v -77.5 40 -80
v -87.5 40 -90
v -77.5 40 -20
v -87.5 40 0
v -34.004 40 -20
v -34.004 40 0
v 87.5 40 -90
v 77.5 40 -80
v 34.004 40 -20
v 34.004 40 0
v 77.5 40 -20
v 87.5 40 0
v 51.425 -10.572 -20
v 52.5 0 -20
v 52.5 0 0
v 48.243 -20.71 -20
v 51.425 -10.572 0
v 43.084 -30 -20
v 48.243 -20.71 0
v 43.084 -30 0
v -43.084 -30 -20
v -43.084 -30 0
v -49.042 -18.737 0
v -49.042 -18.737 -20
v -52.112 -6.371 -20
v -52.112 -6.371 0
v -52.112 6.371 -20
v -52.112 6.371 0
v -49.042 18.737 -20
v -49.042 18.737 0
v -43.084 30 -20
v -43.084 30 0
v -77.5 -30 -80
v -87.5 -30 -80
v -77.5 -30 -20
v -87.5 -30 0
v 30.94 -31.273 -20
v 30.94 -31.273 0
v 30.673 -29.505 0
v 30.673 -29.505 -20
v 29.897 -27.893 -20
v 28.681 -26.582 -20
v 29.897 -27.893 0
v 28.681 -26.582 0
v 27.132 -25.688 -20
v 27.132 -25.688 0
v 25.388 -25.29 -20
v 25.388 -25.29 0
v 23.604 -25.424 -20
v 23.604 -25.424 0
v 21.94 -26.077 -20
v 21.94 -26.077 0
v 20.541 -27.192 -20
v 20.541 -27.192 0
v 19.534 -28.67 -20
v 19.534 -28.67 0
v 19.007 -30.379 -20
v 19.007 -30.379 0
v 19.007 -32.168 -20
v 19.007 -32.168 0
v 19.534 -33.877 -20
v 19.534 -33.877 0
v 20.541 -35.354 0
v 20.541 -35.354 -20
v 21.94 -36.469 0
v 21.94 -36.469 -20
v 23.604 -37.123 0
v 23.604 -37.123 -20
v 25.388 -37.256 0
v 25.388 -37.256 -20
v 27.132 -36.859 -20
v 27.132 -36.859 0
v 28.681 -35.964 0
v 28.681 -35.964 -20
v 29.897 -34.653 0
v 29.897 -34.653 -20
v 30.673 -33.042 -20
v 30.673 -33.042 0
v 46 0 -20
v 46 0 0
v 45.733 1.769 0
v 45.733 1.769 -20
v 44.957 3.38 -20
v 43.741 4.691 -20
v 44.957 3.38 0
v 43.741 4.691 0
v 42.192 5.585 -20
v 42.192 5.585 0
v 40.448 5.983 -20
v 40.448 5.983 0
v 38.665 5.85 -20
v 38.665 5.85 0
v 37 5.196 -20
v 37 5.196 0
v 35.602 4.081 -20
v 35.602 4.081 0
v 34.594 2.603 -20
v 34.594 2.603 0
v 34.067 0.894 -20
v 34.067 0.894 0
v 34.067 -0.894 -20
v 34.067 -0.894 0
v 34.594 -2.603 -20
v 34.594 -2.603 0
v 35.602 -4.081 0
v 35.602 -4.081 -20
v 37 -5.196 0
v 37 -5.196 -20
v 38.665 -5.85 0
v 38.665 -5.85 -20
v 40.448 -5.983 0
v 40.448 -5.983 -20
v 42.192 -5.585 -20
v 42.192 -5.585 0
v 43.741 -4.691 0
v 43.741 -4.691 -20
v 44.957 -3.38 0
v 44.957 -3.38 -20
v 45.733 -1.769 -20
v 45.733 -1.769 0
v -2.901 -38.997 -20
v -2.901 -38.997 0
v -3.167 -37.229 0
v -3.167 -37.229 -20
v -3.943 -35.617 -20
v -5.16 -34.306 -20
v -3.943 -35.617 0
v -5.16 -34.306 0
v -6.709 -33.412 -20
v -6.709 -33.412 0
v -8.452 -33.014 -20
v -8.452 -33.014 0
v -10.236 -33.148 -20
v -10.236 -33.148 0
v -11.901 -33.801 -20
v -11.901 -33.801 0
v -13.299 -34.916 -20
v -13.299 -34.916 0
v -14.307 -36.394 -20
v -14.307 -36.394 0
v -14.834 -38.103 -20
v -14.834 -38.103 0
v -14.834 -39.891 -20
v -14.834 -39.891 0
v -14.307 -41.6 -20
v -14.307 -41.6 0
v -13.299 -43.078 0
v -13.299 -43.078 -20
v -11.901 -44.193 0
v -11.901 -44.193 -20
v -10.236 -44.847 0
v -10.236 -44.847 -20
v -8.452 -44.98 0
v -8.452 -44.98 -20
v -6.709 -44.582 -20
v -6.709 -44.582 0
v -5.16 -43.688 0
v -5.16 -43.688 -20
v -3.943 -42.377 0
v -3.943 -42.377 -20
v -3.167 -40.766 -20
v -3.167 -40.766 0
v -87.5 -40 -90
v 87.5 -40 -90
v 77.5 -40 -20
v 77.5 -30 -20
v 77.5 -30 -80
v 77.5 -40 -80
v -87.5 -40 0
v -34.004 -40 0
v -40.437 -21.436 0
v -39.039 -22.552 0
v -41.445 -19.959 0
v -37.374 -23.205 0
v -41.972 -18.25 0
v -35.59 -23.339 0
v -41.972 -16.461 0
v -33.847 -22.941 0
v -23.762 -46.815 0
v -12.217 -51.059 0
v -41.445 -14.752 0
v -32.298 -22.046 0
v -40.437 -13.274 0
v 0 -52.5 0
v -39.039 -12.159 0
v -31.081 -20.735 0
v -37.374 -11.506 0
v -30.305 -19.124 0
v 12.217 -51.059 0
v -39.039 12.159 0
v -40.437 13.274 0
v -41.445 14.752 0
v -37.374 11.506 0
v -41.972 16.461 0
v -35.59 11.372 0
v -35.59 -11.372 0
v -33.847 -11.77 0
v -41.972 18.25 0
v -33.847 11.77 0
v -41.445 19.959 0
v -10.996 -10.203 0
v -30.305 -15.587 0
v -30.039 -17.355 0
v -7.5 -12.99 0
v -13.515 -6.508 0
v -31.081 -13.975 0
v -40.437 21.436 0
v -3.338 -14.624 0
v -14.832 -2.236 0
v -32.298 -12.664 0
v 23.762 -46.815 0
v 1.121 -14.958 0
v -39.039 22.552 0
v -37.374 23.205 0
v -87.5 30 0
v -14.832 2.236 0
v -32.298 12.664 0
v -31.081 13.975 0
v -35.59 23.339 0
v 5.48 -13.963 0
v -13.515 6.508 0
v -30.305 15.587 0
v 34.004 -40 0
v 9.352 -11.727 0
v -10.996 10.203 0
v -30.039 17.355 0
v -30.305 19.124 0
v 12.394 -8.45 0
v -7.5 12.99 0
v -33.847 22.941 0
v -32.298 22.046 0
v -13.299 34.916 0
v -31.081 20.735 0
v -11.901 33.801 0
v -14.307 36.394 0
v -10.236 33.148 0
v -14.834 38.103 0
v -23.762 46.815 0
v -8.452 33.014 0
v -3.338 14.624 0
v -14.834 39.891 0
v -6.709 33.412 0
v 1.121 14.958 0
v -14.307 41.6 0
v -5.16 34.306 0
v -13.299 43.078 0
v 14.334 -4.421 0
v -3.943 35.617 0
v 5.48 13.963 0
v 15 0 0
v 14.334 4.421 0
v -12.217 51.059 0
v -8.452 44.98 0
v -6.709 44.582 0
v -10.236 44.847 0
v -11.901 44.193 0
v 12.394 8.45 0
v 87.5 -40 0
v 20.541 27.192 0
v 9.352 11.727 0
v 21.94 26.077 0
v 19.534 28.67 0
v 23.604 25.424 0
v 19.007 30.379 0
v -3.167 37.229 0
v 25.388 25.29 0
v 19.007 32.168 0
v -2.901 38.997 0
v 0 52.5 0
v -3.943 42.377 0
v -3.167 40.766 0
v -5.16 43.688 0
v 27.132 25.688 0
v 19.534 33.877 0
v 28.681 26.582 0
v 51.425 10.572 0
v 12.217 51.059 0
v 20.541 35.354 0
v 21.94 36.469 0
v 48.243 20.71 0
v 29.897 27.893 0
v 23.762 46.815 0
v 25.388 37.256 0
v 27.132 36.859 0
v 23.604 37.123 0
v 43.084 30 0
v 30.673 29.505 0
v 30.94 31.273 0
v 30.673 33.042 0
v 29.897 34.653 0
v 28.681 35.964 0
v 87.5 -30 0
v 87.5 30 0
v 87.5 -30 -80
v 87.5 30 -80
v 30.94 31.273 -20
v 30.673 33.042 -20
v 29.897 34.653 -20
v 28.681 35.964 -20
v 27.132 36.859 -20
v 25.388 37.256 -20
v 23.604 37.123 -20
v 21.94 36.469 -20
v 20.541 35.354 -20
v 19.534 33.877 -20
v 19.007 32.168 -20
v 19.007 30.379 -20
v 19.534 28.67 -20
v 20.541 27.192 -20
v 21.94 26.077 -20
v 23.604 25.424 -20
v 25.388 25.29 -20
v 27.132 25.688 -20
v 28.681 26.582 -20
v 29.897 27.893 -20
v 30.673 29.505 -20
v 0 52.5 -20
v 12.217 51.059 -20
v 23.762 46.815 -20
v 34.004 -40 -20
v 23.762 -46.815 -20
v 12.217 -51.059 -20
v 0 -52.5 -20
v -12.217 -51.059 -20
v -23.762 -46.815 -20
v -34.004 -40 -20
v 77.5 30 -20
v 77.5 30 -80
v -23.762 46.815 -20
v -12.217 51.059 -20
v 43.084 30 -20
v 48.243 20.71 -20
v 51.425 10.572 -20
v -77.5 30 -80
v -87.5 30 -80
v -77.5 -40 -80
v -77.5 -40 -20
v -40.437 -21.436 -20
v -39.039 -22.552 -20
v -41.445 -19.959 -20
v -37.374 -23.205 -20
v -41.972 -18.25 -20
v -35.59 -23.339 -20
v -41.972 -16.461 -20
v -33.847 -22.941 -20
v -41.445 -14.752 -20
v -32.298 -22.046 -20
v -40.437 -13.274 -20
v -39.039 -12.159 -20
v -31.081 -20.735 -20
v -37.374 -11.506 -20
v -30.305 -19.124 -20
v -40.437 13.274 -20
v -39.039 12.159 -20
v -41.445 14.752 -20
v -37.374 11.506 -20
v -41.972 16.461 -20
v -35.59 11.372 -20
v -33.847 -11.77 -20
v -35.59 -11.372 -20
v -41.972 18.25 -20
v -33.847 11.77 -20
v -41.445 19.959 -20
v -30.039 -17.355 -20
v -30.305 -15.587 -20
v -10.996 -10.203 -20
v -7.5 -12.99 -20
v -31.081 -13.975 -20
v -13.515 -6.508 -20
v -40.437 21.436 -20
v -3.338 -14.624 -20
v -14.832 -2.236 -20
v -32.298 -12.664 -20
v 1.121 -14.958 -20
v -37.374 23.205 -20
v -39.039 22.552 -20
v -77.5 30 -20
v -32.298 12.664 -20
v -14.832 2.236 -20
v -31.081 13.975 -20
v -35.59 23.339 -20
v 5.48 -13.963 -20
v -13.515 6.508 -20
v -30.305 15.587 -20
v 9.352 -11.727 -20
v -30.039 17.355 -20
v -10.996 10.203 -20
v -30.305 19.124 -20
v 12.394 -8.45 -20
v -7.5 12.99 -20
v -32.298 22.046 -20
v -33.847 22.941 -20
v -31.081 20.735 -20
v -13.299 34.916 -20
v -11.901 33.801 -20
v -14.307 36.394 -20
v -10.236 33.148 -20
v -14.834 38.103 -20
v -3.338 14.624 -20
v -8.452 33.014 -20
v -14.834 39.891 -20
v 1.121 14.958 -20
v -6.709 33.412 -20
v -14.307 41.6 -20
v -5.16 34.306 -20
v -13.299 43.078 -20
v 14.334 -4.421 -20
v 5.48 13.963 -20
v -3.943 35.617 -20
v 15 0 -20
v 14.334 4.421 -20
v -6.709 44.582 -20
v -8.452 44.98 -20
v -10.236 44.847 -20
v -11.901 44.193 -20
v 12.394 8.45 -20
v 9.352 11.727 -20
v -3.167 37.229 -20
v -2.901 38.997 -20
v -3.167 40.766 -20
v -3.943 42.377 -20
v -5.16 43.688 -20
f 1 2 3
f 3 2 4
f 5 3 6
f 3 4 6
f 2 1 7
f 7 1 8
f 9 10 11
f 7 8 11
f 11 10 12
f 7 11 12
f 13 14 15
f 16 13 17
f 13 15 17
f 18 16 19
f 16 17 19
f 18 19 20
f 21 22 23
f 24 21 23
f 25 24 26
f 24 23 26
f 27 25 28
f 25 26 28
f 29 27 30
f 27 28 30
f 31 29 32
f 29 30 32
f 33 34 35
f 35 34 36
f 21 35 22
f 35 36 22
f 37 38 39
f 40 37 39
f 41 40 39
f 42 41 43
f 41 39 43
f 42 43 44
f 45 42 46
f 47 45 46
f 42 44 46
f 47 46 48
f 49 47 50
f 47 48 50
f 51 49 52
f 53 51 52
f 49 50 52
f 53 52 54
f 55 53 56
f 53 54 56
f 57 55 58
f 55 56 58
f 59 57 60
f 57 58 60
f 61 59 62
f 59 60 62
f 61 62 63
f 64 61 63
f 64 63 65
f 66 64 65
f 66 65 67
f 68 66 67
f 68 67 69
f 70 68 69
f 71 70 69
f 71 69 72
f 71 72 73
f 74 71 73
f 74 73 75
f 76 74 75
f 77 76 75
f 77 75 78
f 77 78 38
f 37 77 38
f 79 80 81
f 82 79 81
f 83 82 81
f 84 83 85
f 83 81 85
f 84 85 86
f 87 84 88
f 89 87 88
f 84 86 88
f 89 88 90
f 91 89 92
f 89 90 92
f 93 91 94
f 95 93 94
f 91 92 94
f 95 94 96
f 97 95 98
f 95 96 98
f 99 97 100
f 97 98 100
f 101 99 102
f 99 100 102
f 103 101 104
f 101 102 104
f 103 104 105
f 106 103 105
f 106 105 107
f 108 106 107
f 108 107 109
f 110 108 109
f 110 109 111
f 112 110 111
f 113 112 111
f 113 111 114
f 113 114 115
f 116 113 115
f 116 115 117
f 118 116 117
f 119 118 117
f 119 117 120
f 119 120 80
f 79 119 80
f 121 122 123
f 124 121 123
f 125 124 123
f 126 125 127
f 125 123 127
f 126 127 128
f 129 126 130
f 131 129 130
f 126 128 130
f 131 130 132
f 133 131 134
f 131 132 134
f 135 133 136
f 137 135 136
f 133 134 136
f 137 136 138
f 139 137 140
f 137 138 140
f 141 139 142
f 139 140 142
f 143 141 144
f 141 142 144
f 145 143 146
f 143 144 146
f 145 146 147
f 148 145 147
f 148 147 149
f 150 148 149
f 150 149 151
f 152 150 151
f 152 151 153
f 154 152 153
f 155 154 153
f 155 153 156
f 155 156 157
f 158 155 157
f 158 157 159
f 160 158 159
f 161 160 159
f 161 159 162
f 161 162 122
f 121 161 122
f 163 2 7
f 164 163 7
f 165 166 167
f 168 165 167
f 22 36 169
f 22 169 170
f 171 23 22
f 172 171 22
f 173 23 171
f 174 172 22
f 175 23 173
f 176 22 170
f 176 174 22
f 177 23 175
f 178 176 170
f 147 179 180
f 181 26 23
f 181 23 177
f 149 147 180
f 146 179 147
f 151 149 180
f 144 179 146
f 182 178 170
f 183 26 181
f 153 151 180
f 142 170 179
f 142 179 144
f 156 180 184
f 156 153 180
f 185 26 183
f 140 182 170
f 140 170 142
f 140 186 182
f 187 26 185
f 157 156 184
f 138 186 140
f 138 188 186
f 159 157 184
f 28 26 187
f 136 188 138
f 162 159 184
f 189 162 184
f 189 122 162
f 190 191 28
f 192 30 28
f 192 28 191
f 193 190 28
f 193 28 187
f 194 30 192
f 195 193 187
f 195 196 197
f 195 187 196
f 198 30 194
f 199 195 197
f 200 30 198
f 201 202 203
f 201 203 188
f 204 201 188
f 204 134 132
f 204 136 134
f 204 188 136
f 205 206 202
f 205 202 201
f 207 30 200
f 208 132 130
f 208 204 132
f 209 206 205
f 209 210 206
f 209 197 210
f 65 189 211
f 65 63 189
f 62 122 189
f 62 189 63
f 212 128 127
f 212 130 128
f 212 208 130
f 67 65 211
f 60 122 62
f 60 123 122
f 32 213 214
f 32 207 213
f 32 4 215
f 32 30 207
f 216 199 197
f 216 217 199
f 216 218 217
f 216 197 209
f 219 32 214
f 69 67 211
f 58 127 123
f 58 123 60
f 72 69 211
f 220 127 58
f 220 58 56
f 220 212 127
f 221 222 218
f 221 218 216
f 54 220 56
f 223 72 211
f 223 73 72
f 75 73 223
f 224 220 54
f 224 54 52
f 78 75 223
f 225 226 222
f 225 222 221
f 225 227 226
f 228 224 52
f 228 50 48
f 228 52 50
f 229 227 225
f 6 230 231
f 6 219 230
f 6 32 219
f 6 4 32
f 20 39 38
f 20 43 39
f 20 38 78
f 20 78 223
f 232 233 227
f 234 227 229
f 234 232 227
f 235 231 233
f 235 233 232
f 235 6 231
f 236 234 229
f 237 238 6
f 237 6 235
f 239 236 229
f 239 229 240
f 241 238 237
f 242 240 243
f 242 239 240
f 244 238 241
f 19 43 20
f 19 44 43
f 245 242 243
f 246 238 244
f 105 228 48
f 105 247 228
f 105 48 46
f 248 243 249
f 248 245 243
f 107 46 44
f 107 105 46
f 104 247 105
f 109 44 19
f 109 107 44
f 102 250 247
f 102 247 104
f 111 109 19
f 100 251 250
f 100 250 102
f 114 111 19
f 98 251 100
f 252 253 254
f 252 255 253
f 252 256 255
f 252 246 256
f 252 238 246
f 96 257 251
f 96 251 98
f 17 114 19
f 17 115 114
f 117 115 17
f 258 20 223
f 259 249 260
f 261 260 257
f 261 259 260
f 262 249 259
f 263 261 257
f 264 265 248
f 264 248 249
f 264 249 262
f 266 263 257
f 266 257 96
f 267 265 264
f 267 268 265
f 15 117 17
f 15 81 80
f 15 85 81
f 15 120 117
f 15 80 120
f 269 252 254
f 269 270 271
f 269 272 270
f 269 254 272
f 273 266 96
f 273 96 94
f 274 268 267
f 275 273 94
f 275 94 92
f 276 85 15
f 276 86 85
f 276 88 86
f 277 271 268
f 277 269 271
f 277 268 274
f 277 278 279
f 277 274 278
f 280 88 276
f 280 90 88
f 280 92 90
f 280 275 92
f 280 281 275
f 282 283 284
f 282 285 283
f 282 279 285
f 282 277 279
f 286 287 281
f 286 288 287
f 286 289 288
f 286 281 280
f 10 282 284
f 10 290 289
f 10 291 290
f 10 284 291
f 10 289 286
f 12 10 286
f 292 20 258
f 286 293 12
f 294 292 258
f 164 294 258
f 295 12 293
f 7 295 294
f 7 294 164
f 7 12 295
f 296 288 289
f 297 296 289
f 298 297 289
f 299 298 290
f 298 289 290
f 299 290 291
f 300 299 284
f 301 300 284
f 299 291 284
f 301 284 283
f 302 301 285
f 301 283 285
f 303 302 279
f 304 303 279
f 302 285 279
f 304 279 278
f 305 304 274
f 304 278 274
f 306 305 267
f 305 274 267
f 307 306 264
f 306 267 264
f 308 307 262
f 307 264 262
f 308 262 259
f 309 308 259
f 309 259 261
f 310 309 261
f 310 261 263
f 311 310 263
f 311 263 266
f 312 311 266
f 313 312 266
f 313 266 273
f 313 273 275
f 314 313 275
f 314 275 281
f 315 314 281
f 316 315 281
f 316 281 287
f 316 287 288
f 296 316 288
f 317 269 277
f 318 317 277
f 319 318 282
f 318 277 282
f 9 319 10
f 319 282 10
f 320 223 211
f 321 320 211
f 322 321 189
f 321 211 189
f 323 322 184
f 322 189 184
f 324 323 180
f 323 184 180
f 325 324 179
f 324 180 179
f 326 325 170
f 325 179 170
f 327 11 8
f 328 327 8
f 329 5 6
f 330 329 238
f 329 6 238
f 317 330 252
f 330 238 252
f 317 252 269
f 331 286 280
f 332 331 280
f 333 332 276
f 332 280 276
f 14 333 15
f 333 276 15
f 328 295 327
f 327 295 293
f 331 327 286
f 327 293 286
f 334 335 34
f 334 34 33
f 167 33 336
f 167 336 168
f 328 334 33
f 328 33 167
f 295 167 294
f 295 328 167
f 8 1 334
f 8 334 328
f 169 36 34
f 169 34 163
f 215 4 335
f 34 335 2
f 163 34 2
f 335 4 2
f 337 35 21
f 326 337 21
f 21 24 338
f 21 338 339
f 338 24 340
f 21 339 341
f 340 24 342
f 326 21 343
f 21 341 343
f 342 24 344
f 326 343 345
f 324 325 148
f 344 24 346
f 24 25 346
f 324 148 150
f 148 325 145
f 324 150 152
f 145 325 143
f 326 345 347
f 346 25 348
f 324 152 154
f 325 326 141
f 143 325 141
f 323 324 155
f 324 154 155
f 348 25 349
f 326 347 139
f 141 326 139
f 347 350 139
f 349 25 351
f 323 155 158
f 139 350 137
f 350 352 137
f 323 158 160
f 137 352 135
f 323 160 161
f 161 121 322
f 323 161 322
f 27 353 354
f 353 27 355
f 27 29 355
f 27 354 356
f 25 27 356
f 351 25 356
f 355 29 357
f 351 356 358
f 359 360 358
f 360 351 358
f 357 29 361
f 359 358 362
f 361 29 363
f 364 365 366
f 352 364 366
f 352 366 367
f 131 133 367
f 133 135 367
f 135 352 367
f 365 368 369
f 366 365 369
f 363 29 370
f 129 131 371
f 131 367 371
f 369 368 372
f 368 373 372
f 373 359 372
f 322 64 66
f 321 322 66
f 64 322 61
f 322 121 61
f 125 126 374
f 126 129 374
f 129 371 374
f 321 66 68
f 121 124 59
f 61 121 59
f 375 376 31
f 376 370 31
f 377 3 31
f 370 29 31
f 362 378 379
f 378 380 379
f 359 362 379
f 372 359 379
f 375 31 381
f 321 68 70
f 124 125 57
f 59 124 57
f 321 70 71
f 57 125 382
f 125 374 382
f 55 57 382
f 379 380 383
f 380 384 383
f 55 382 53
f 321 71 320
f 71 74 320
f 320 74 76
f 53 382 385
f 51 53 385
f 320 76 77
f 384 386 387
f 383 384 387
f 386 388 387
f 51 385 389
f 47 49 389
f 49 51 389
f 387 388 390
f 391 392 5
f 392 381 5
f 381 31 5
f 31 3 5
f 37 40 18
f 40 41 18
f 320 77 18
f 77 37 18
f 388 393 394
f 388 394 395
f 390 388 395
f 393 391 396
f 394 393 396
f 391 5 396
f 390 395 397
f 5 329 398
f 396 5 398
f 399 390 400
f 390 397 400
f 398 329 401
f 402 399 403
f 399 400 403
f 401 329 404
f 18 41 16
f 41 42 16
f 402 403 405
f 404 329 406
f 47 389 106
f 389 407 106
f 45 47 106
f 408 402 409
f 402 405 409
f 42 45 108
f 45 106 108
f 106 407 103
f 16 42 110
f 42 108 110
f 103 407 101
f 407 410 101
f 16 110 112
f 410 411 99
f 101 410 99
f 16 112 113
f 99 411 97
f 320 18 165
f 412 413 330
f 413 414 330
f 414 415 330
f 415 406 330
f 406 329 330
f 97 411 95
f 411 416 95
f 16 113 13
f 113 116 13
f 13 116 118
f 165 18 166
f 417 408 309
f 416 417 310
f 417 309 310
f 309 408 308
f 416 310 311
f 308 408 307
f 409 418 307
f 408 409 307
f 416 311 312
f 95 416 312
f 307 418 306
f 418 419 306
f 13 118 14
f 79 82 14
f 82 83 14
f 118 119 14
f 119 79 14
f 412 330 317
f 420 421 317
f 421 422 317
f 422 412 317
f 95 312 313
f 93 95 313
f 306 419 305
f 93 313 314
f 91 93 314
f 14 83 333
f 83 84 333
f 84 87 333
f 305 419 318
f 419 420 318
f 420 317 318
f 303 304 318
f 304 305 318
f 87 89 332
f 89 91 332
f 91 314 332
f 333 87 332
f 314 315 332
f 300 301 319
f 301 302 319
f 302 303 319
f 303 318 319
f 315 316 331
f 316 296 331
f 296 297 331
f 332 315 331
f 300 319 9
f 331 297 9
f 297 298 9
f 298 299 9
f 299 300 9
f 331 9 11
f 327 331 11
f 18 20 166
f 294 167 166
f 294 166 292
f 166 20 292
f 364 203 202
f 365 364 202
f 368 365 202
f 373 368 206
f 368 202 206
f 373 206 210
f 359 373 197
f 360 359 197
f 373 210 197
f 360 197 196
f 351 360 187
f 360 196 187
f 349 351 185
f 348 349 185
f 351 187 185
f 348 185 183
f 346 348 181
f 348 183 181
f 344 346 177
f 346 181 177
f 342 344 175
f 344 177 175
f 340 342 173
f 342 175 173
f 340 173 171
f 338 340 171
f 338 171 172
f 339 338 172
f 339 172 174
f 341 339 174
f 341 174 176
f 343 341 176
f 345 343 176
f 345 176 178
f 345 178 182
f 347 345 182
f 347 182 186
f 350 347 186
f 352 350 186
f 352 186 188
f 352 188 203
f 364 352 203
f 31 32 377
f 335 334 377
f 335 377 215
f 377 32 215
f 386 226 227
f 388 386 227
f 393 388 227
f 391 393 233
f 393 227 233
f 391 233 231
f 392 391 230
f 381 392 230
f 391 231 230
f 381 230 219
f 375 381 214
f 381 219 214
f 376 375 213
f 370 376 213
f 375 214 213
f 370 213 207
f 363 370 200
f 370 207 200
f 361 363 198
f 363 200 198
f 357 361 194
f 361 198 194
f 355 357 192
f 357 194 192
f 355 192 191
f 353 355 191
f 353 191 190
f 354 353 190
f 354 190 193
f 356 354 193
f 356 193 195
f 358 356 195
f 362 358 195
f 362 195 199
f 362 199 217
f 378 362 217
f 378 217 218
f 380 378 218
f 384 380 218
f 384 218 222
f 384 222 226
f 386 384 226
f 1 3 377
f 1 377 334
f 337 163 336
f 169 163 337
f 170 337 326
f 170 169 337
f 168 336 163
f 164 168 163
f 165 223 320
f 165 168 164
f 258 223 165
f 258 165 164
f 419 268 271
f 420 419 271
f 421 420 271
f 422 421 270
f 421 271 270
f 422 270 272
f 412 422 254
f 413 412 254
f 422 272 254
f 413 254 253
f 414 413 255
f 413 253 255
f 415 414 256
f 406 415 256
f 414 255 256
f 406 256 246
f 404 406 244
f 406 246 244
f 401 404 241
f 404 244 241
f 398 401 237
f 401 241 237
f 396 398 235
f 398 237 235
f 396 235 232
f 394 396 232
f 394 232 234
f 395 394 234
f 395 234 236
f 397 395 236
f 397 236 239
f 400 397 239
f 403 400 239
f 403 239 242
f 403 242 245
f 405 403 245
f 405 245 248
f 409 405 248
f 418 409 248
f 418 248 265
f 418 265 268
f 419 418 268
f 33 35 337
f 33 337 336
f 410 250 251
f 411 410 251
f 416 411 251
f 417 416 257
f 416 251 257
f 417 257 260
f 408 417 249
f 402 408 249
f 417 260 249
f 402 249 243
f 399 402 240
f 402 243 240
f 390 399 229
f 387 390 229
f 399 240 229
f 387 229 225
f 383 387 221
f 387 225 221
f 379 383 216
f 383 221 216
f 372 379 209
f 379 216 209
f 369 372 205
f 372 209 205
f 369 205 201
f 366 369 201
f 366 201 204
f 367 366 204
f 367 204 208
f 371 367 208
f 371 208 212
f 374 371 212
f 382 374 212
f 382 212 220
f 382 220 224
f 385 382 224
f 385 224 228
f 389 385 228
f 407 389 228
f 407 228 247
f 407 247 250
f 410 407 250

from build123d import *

# Parameters (mm, degrees)
SKETCH2_W           = 175
SKETCH2_H           = 90
SKETCH2_W_2         = 155
SKETCH2_H_2         = 60
BOSS_EXTRUDE3_DEPTH = 52.5
SKETCH3_R           = 6
SKETCH3_R_2         = 15
CUT_EXTRUDE1_DEPTH  = 80
SKETCH4_W           = 175
SKETCH4_H           = 12.5
CUT_EXTRUDE2_DEPTH  = 10


with BuildPart() as part:
    # Sketch2 → Boss-Extrude3 (new, symmetric)
    with BuildSketch(Plane(origin=(0, 0, 0), x_dir=(1, 0, 0), z_dir=(0, 1, 0))):
        with Locations((0, 45)):
            Rectangle(SKETCH2_W, SKETCH2_H)
        with Locations((0, 50)):
            Rectangle(SKETCH2_W_2, SKETCH2_H_2, mode=Mode.SUBTRACT)
    extrude(amount=BOSS_EXTRUDE3_DEPTH, both=True)

    # Sketch3 → Cut-Extrude1 (cut)
    with BuildSketch(Plane.XY):
        with BuildLine():
            Line((-87.5, 52.5), (-87.5, 40))
            Line((-87.5, 40), (-34.003676272, 40))
            ThreePointArc((-34.003676272, 40), (-18.114220897, 49.276008374), (7.6e-08, 52.5))
            Line((7.6e-08, 52.5), (-87.5, 52.5))
        make_face()
        with BuildLine():
            Line((87.5, 52.5), (7.6e-08, 52.5))
            ThreePointArc((7.6e-08, 52.5), (18.114220968, 49.276008348), (34.003676272, 40))
            Line((34.003676272, 40), (87.5, 40))
            Line((87.5, 40), (87.5, 52.5))
        make_face()
        with BuildLine():
            Line((-34.003676272, -40), (-87.5, -40))
            Line((-87.5, -40), (-87.5, -52.5))
            Line((-87.5, -52.5), (0, -52.5))
            ThreePointArc((0, -52.5), (-18.114220933, -49.276008361), (-34.003676272, -40))
        make_face()
        with BuildLine():
            ThreePointArc((34.003676272, -40), (18.114220933, -49.276008361), (0, -52.5))
            Line((0, -52.5), (87.5, -52.5))
            Line((87.5, -52.5), (87.5, -40))
            Line((87.5, -40), (34.003676272, -40))
        make_face()
        with BuildLine():
            Line((87.5, 30), (43.084219849, 30))
            ThreePointArc((43.084219849, 30), (50.090775309, 15.721457597), (52.5, 0))
            ThreePointArc((52.5, 0), (50.090775309, -15.721457597), (43.084219849, -30))
            Line((43.084219849, -30), (87.5, -30))
            Line((87.5, -30), (87.5, 30))
        make_face()
        with BuildLine():
            Line((-43.084219849, 30), (-87.5, 30))
            Line((-87.5, 30), (-87.5, -30))
            Line((-87.5, -30), (-43.084219849, -30))
            ThreePointArc((-43.084219849, -30), (-52.5, 0), (-43.084219849, 30))
        make_face()
        with Locations((-8.900837358, 38.997116487)):
            Circle(SKETCH3_R)
        with Locations((24.939592074, 31.273259299)):
            Circle(SKETCH3_R)
        with Locations((-36.038754716, 17.355349565)):
            Circle(SKETCH3_R)
        with Locations((40, 0)):
            Circle(SKETCH3_R)
        with Locations((-36.038754716, -17.355349565)):
            Circle(SKETCH3_R)
        with Locations((-8.900837358, -38.997116487)):
            Circle(SKETCH3_R)
        with Locations((24.939592074, -31.273259299)):
            Circle(SKETCH3_R)
        Circle(SKETCH3_R_2)
    extrude(amount=-CUT_EXTRUDE1_DEPTH, mode=Mode.SUBTRACT)

    # Sketch4 → Cut-Extrude2 (cut)
    with BuildSketch(Plane.XY.offset(-80)):
        with Locations((0, 46.25)):
            Rectangle(SKETCH4_W, SKETCH4_H)
        with Locations((0, -46.25)):
            Rectangle(SKETCH4_W, SKETCH4_H)
    extrude(amount=-CUT_EXTRUDE2_DEPTH, mode=Mode.SUBTRACT)


solid = part.part
